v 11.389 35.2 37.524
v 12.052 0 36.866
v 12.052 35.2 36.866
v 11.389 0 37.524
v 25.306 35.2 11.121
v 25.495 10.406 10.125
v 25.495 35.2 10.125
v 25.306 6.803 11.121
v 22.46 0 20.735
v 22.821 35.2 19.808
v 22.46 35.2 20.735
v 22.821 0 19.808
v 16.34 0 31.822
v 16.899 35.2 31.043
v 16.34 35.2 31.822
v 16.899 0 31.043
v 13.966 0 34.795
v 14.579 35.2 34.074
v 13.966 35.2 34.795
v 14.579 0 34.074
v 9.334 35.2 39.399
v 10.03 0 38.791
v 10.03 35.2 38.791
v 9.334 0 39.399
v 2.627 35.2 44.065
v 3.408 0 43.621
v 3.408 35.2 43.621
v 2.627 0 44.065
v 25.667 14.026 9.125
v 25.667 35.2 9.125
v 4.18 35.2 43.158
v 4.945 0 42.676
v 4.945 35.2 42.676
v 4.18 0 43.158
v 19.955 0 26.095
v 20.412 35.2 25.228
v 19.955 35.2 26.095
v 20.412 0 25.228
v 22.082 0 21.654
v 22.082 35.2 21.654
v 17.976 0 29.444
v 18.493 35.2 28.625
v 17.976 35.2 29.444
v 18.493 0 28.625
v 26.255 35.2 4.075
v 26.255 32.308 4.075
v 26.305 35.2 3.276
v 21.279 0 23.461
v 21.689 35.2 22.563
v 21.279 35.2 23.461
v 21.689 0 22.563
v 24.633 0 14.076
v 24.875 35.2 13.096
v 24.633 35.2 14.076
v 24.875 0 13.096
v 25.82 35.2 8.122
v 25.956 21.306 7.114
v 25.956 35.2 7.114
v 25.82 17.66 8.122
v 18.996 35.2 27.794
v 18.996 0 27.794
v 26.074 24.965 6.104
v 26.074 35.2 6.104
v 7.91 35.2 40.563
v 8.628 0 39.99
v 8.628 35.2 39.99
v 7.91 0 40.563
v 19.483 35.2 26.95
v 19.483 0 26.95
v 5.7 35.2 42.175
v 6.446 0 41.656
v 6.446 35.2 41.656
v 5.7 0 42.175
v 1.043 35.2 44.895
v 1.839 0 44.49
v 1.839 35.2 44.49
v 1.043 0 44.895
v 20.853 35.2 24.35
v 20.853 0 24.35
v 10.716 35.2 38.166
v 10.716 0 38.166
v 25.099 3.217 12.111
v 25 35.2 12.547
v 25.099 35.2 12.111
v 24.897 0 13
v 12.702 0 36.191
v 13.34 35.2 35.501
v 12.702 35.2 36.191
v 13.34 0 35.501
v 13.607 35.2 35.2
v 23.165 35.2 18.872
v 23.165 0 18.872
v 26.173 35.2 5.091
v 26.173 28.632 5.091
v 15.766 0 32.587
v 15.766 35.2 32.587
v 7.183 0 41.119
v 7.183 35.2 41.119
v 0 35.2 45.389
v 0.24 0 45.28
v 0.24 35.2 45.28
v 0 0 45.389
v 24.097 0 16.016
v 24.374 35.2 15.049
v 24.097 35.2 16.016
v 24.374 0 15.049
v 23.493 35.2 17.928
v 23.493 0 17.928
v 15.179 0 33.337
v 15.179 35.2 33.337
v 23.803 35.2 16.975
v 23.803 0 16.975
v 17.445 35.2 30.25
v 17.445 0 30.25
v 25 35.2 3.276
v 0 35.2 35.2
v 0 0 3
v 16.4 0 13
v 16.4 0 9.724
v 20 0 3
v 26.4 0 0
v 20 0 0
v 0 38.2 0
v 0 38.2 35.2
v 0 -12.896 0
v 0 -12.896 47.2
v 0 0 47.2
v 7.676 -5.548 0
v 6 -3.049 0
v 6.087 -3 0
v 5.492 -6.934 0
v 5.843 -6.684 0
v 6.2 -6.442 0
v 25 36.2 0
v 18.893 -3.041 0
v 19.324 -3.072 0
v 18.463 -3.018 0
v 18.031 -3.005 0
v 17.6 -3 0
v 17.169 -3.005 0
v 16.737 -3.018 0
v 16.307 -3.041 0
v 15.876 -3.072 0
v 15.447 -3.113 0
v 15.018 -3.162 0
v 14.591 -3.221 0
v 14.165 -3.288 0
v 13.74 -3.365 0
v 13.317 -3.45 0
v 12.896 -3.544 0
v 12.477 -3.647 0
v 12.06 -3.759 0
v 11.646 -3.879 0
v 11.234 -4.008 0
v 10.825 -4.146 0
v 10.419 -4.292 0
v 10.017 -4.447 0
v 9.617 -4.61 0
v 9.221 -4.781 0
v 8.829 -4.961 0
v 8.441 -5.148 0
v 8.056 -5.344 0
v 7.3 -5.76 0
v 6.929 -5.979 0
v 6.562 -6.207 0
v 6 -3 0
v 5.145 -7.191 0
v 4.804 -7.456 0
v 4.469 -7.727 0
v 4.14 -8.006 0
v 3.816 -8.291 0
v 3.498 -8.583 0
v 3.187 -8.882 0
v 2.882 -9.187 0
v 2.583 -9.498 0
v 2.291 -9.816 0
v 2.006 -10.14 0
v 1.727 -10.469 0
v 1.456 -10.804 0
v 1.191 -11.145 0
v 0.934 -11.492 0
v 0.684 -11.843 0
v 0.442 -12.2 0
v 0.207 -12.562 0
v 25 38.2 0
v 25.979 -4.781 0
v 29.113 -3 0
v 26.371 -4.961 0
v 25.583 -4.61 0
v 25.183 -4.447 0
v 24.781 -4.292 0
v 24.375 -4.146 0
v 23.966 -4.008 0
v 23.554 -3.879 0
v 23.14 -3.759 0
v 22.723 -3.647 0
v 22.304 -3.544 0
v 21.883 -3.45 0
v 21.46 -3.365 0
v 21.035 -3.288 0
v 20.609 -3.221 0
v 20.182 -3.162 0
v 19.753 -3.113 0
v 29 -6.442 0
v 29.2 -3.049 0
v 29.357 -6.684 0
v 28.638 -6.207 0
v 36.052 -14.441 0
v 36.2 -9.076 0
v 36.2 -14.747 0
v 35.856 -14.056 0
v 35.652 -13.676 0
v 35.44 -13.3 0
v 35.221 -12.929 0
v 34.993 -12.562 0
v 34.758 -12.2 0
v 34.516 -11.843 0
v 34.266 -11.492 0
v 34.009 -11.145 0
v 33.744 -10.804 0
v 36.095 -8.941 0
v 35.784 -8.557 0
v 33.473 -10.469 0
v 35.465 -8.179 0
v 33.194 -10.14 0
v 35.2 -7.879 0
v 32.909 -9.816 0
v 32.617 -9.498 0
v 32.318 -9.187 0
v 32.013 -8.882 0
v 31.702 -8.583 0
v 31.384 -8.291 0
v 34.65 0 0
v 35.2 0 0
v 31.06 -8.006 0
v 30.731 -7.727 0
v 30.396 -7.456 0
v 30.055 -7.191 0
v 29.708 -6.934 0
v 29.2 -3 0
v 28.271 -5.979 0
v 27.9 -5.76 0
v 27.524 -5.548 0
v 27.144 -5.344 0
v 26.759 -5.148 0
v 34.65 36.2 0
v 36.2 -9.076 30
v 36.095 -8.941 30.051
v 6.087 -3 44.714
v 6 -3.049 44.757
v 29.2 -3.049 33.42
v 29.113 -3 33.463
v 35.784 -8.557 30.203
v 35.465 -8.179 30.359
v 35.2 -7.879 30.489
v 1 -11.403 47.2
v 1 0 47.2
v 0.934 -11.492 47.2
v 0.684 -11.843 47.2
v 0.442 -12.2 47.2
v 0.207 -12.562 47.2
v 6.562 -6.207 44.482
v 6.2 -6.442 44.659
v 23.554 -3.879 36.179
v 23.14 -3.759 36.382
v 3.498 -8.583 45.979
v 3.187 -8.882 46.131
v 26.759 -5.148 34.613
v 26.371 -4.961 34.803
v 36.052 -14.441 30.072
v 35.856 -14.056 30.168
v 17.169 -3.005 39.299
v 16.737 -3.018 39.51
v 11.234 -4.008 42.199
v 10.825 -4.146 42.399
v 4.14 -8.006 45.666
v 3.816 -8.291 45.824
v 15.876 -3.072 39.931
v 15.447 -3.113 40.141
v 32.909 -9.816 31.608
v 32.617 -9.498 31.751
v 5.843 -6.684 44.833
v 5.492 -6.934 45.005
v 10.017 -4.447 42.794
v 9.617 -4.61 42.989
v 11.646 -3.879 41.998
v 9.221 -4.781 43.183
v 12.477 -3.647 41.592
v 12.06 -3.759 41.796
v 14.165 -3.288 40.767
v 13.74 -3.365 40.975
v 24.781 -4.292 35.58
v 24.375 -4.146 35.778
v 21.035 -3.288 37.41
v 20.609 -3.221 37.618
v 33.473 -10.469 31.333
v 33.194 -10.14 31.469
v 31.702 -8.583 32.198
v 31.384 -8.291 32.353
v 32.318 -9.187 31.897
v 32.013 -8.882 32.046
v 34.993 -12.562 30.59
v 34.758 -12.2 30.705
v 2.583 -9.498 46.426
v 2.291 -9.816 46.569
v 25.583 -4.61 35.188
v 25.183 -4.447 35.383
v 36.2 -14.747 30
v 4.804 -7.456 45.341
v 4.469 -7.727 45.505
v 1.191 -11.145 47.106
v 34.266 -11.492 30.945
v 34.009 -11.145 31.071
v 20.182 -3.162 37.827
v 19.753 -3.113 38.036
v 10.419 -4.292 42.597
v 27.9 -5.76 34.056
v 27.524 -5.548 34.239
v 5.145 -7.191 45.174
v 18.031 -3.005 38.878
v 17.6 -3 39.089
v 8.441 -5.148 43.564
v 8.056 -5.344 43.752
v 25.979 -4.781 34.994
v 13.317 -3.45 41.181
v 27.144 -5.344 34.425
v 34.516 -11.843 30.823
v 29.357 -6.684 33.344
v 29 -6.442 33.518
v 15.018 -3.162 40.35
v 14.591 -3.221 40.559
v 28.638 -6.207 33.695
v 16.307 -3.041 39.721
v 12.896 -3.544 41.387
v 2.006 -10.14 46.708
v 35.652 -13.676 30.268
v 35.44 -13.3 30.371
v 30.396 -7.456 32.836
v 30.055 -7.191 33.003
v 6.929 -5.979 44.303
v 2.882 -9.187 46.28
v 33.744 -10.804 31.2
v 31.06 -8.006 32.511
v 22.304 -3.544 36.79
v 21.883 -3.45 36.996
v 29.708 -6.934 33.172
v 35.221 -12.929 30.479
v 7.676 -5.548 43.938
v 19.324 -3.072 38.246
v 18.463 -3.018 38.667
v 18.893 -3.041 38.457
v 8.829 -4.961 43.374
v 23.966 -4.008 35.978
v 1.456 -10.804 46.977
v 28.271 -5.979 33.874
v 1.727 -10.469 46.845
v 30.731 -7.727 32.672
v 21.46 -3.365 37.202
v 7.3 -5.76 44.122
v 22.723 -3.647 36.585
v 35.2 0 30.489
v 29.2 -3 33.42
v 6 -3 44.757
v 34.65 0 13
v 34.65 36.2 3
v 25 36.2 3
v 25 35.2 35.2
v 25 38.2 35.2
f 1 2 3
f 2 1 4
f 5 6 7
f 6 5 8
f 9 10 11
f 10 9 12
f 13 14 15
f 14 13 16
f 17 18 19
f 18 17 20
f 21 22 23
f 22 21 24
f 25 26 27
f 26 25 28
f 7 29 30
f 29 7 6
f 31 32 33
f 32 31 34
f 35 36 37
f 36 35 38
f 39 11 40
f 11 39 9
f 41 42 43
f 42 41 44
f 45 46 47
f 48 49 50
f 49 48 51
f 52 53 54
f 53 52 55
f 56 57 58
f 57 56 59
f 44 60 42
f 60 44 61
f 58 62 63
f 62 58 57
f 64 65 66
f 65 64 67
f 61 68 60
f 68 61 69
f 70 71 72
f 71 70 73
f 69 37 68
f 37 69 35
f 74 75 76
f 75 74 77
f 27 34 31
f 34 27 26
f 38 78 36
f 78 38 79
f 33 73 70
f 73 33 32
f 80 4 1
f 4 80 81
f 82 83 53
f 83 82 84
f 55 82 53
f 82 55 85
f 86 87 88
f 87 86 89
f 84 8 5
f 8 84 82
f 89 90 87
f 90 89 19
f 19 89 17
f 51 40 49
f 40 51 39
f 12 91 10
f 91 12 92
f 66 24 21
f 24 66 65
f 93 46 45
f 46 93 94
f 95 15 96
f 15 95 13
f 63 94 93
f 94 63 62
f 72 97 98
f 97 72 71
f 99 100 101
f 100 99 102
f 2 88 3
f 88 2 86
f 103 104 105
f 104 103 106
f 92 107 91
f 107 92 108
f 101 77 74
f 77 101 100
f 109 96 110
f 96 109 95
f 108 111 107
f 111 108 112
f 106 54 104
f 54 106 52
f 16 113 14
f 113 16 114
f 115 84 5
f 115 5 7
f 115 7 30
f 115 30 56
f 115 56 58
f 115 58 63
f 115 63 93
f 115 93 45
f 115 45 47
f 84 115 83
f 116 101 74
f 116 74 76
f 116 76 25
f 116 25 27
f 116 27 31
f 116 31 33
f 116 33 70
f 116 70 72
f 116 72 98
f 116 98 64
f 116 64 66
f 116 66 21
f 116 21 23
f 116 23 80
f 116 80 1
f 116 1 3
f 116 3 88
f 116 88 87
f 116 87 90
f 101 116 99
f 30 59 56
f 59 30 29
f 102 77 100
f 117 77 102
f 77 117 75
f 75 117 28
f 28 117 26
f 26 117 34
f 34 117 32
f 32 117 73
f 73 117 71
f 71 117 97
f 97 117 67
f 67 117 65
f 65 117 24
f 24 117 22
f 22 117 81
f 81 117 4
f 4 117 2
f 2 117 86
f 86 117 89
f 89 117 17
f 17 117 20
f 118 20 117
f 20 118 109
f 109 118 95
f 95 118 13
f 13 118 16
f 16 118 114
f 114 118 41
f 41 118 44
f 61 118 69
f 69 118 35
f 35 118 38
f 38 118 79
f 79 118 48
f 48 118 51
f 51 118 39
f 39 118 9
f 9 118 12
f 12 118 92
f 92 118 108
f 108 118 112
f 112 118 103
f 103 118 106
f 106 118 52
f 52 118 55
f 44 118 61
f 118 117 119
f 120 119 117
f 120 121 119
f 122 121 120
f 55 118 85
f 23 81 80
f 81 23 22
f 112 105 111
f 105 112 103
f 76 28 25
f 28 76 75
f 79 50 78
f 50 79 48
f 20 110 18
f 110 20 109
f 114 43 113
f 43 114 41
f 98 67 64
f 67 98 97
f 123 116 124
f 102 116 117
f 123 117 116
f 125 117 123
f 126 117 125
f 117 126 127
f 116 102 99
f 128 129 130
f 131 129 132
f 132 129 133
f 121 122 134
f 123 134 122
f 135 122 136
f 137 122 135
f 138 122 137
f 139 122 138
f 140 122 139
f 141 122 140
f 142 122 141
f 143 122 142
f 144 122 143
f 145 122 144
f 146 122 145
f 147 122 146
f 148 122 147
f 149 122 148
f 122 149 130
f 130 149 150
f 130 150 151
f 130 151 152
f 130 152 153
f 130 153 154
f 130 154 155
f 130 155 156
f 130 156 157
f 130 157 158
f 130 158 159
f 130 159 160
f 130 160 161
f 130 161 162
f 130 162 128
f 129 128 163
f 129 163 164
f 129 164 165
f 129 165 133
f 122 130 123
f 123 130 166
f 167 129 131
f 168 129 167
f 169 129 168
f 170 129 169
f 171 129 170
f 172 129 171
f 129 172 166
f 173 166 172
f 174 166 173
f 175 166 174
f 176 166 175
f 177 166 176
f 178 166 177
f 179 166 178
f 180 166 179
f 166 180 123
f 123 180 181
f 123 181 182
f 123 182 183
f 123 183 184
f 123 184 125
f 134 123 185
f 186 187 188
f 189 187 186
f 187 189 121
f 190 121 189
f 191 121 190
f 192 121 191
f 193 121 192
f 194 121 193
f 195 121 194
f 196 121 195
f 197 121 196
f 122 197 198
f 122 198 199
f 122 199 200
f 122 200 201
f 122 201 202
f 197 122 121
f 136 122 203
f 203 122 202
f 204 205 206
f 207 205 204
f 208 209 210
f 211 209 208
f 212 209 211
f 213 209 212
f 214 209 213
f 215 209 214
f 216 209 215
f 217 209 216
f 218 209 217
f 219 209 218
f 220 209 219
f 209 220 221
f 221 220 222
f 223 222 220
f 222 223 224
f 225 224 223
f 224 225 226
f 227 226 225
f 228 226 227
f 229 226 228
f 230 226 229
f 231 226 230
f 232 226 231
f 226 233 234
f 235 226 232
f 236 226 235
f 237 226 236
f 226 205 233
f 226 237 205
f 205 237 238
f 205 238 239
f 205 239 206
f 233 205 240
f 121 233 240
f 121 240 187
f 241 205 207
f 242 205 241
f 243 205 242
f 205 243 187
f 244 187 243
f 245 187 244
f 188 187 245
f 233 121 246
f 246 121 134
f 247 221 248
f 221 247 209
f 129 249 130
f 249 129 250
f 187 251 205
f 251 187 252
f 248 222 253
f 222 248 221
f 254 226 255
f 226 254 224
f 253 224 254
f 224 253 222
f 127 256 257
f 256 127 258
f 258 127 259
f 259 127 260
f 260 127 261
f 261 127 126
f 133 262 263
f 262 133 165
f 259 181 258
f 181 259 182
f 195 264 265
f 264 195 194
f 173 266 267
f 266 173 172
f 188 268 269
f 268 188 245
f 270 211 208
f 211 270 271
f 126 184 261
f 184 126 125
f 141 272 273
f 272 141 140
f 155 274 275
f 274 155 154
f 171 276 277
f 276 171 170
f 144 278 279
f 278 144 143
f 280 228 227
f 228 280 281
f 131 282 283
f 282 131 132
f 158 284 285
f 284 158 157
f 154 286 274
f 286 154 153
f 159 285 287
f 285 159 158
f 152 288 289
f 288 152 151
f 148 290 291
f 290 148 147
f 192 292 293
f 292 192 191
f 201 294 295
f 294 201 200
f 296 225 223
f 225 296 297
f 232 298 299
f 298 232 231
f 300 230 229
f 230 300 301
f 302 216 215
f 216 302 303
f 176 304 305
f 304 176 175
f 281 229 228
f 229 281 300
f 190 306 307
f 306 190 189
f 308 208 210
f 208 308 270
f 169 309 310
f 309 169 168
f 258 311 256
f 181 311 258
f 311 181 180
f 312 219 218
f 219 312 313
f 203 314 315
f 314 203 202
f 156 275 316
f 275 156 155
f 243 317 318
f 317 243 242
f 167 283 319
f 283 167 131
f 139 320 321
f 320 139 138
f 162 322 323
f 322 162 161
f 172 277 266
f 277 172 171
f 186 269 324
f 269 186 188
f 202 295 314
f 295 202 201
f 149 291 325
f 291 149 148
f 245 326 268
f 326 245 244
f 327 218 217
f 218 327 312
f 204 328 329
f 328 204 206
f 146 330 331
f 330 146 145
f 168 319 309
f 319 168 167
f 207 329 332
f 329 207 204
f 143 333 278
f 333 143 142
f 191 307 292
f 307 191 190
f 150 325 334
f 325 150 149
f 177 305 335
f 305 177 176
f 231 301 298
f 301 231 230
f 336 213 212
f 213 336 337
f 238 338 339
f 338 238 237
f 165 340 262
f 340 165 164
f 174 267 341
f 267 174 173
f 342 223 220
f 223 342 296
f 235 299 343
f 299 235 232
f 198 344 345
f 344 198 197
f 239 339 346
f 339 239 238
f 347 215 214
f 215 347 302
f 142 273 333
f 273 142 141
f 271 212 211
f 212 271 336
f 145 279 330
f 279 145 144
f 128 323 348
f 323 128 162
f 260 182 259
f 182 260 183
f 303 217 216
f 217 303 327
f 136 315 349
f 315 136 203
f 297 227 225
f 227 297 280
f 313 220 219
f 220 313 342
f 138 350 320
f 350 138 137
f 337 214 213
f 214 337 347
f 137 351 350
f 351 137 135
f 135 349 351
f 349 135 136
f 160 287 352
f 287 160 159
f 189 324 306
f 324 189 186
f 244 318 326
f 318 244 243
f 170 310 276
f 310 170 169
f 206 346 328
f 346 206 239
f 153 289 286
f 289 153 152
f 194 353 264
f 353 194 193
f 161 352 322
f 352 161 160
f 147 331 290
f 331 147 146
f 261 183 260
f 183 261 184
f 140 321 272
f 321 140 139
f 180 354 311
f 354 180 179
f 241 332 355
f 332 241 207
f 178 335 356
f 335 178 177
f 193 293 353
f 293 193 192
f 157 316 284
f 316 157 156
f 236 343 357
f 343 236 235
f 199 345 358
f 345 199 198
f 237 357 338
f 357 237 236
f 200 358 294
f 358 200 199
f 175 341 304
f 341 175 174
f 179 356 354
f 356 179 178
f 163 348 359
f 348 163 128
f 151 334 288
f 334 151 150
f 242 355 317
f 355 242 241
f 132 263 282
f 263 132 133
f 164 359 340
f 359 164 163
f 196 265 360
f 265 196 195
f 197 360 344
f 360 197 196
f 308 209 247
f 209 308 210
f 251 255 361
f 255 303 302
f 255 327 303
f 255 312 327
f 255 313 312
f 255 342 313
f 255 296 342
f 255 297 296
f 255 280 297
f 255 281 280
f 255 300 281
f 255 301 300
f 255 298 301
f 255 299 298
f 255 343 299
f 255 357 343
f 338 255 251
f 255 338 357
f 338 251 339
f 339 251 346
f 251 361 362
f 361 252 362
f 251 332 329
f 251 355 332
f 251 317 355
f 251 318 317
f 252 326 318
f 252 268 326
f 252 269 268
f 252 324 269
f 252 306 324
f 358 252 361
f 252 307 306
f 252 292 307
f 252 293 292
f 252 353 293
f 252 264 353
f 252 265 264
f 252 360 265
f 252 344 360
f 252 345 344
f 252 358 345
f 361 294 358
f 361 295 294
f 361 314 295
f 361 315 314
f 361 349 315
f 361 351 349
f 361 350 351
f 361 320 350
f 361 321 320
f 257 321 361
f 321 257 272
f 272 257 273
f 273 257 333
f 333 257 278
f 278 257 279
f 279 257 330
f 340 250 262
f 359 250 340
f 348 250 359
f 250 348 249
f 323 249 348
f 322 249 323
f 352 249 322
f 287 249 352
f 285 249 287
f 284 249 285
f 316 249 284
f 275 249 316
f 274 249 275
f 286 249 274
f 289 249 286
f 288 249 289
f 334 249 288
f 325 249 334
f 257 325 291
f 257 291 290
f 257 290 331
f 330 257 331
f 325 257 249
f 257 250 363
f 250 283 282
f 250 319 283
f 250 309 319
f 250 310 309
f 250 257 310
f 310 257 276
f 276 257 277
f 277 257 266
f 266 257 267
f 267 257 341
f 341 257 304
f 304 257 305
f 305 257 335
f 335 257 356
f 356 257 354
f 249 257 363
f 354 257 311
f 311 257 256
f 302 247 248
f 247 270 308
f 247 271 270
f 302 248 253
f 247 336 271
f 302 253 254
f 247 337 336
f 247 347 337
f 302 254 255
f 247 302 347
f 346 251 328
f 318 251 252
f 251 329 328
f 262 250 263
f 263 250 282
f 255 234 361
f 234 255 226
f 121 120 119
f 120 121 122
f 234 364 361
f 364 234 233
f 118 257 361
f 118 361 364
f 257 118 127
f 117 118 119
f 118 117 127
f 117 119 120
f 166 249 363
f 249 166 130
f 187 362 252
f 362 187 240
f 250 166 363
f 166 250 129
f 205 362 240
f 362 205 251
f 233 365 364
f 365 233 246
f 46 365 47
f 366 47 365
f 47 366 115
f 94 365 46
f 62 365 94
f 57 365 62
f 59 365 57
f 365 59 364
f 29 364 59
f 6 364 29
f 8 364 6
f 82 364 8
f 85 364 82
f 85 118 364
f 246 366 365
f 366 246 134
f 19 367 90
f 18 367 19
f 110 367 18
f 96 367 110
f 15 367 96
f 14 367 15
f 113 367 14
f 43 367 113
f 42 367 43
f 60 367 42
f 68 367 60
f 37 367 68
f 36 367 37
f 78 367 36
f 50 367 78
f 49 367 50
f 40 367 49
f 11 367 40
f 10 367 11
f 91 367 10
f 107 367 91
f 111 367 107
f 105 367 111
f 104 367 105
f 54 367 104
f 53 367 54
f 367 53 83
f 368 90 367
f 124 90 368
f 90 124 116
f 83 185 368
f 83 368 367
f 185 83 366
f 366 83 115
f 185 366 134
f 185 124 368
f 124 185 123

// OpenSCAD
// file: magazine.scad
//use <MCAD/regular_shapes.scad>

$fn = $preview ? 50 : 300;

WIGGLE_PERCENT = 10;
WIGGLE_COEFF = 1 + WIGGLE_PERCENT/100;
PIECE_D = 32 * WIGGLE_COEFF;
PIECE_H = 7.5 * WIGGLE_COEFF;

module piece() {
    difference() {
        cylinder(h=PIECE_H/WIGGLE_COEFF,
                 d=PIECE_D/WIGGLE_COEFF);

        translate([0, 0, -0.5])
        cylinder(h=1 + PIECE_H/WIGGLE_COEFF,
                 d=PIECE_D/WIGGLE_COEFF * 0.75);
    }
}

module piece_wiggle() { cylinder(h=PIECE_H, d=PIECE_D); }

BOARD_H = 197;
BOARD_W = 259;
BOARD_D = 16.5;

module board() { cube([BOARD_W, BOARD_D, BOARD_H]); }

HOPPER_W = 45;
HOPPER_L = 20;
HOPPER_H = 60;

module hole_negative() {
    scale([1.01, 1.01, 1.01])
    rotate([180, 0, 0])
    translate([0, 0, -HOPPER_H/2])
    hull()
    for (x = [-1, 1]) {
        for (y = [-1, 1]) {
            translate([1.1 * x * PIECE_D/2,
                       1.2 * y * PIECE_H/2,
                       0])
            square_pyramid(5.5, 7, HOPPER_H);
        }
    }
}

module hopper() {
    translate([0, 0, HOPPER_H / 2])
    difference() {
        cube([HOPPER_W, HOPPER_L, HOPPER_H], center=true);

        #
        translate([0, 0, 25])
        cube([HOPPER_W + 5, HOPPER_L + 2, 10], center=true);

        #
        hole_negative();
    }
}

//difference() {
//    hopper();
//    translate([-50, -50, 20])
//    #
//    cube([100, 100, 100]);
//}


ANGLE=40;
INNER_RAD=30;
THICKNESS=3;
PICKLES=30;

module hotdog() {
    rotate_extrude(angle=ANGLE)
    translate([INNER_RAD, 0, 0])
    square([THICKNESS, PIECE_D]);
}

module hamburg() {
    rotate_extrude(angle=ANGLE)
    translate([INNER_RAD, 0, 0])
    square([THICKNESS, PIECE_H]);
}

module pickle(ang, tx, ty) {
    translate([tx, ty, 0])
    rotate([0,0,ang])
    translate([-(INNER_RAD + THICKNESS), 1/2, 0])
    rotate([90, 0, 0])
    rotate_extrude(angle=ANGLE)
    translate([INNER_RAD, 0, 0])
    square(THICKNESS);
}

module hot_hamburg() {
    module pickle_slice() {
        dang = 90/PICKLES;
        for (i = [0:PICKLES-1]) {
            hull() {
                pickle(i*dang, 0, 0);
                pickle((i+1)*dang, 0, 0);
            }
        }
    }

    pickle_slice();

    translate([0, PIECE_H, 0])
    mirror([0, 1, 0])
    pickle_slice();

    translate([0, -(INNER_RAD + THICKNESS), 0])
    rotate([90, 0, 90])
    hotdog();

    translate([-(INNER_RAD + THICKNESS), PIECE_H, 0])
    rotate([90, 0, 0])
    hamburg();
}

module hot_hamburg_sandwich() {
    hot_hamburg();
    translate([PIECE_D, PIECE_H, 0])
    rotate([0, 0, 180])
    hot_hamburg();
}

//scale([1.05, 1.05, 1.05])
//hot_hamburg_sandwich();
//
//translate([PIECE_D/2,PIECE_H,0])
//rotate([90,0,0])
//#piece();

module mag(asHu) {
    CAPACITY = 15;
    ANGLE = 160;
    WALLS_HEIGHT = CAPACITY * PIECE_H + THICKNESS;

    translate([0, 0, THICKNESS])
    for (za = [0,180]) {

        rotate([0,0,za])
        rotate_extrude(angle=ANGLE)
        translate([PIECE_D/2, 0, 0])
        square([THICKNESS, WALLS_HEIGHT]);

    }
    cylinder(h=THICKNESS, d=PIECE_D + 2*THICKNESS);

    translate([0, 0, WALLS_HEIGHT])
    rotate_extrude(angle=360)
    translate([PIECE_D/2, 0,0])
    square([THICKNESS, THICKNESS]);
}

module string_rider() {
    difference() {
        cylinder(d=PIECE_D / WIGGLE_COEFF, h=PIECE_H);

        CHANNEL_H = PIECE_H / 3;
        #
        translate([0,0,CHANNEL_H/2 + 1])
        cube([PIECE_D * 2, 5, CHANNEL_H], center=true);
    }
}

//difference() {
//    X = -5;
//    Y = THICKNESS;
//
//    translate([-X/2, 0, 0])
//    cube([2 * MAG_R + X, MAG_R + Y, 20]);
//
//    MAG_R = PIECE_D/2 + THICKNESS;
//    translate([MAG_R, 0, -1])
//    cylinder(h=22, r=MAG_R);
//}

//translate([0,0,5])
//string_rider();

//*
//for (i = [0:CAPACITY-1]) {
//    translate([0,0,i*PIECE_H])
//    translate([0,0,THICKNESS])
//    #piece();
//}

//piece();
// main file
use <MCAD/regular_shapes.scad>
include <magazine.scad>

//translate([PIECE_D/2,0,0])
//%piece();

module ramp() {

    RAMP_THICKNESS = 3;
    RAMP_RISE = 30;
    RAMP_RUN = PIECE_D + 20;

    // Ramp
    translate([RAMP_THICKNESS, 0, 0])
    hull() {
        cube([PIECE_H, 1, RAMP_THICKNESS]);

        translate([0, RAMP_RUN, RAMP_RISE - THICKNESS])
        cube([PIECE_H, 1, RAMP_THICKNESS]);
    }

    // Walls
    TOP_HEIGHT = 30;
    // left wall
    hull() {
        cube([RAMP_THICKNESS, RAMP_RUN + 1, RAMP_RISE]);

        translate([0, 0, RAMP_RISE + TOP_HEIGHT])
        #cube([0.1, RAMP_RUN, 0.1]);
    }

    // back wall
    translate([0, RAMP_RUN - RAMP_THICKNESS + 1])
    cube([PIECE_H + RAMP_THICKNESS, RAMP_THICKNESS, RAMP_RISE + TOP_HEIGHT]);

    // right wall
    translate([RAMP_THICKNESS + PIECE_H, 0, 0])
    cube([RAMP_THICKNESS, RAMP_RUN + 1, RAMP_RISE + TOP_HEIGHT]);


    // Magazine sleeve
    SLEEVE_WIDTH = 12;
    SLEEVE_HEIGHT = RAMP_RISE;
    translate([-PIECE_D/2 - THICKNESS, RAMP_RUN/2, 0])
    {
        difference(){
            cylinder_tube(SLEEVE_HEIGHT, PIECE_D/2 + 2 * THICKNESS, THICKNESS);

            SLEEVE_CUT = 1000;
            translate([-SLEEVE_CUT/2 + SLEEVE_WIDTH, 0, 0])
            cube([SLEEVE_CUT, SLEEVE_CUT, SLEEVE_CUT], center=true);
        }

        %mag();
    }

}

module rotramp(height, dz, angle, width, depth) {
//    translate([width/2, depth/2, dz/2])
    for (z = [0:dz:height-dz]) {
        hull() {
            for (i = [0,1]) {
                rotate([0,0,(z + i*dz)/height * -angle])
                translate([0, 0, z + i*dz])
                cube([width, depth, dz], center=false);
            }
        }
    }
}

//RAMP_RUN = PIECE_D * 1.5;
//RAMP_ANGLE = 90;
//RAMP_WIDTH = PIECE_D;

//cube([THICKNESS, RAMP_RUN, PIECE_D]);

RAMP_RUN = PIECE_D;
RAMP_HEIGHT_GUESS = PIECE_D + 12; // This depends on STRETCH
STRETCH = 15;
RAMP_WIDTH = PIECE_D * 0.75;

module ramp() {

SLIDEY_COEFF = 1.9;
RAMP_ANGLE=30;
//intersection() {
//    scale([1, 1, 1.2])
//    translate([6.4, 0])
//    translate([0, 0, 1.2 * RAMP_WIDTH])
//    rotate([0, 90 - RAMP_ANGLE])
//    translate([SLIDEY_COEFF * RAMP_WIDTH - 10, 0, 0])
//    mirror([1,0,0])
//    rotate([-90, 0, 0])
//    rotramp(RAMP_RUN, $preview ? 1 : 0.05, RAMP_ANGLE, SLIDEY_COEFF * RAMP_WIDTH, THICKNESS);
//
//    cube(100);
//}

//translate([30, 0, 0])
//mirror([1,0])
//rotate([0, 30, 10])
//cube([THICKNESS, RAMP_RUN, RAMP_HEIGHT_GUESS]);

//translate([RAMP_WIDTH, 0])
//rotate([0, 90, 0])
//%piece();

translate([0, RAMP_RUN, 0])
rotate([90, 0, 0])
intersection()  {
    translate([-STRETCH, 0, 0])
    oval_prism(RAMP_RUN, PIECE_D + STRETCH - THICKNESS/2, RAMP_WIDTH + STRETCH);
    cube(10 * STRETCH);
}

//mirror([1,0])
//cube([THICKNESS, RAMP_RUN, RAMP_HEIGHT_GUESS + PIECE_H]);

CUPPER_CUTOFF = 15;
CUPPER_LOW_HEIGHT = 30;

module cupper_bounds() {
    translate([0, -CUPPER_CUTOFF])
    hull() {
        cube([1, CUPPER_CUTOFF, RAMP_HEIGHT_GUESS]);
        translate([PIECE_D,0])
        cube([1, CUPPER_CUTOFF, CUPPER_LOW_HEIGHT]);
    }
}

intersection() {
    translate([PIECE_D/2, -PIECE_D/2 - 2*THICKNESS]) {
//        %mag();
        cylinder_tube(RAMP_HEIGHT_GUESS, (PIECE_D + 4 * THICKNESS)/2, THICKNESS);
    }

    cupper_bounds();
}

intersection() {
    mirror([0, 1, 0])
    cube([PIECE_D, THICKNESS, RAMP_HEIGHT_GUESS]);
    cupper_bounds();
}

intersection() {
    cupper_bounds();
    mirror([0,1,0])
    cube([THICKNESS, CUPPER_CUTOFF - 6, RAMP_HEIGHT_GUESS]);
}

intersection() {
    cupper_bounds();
    translate([THICKNESS, 0])
    mirror([0,1,0])
    cube([THICKNESS, CUPPER_CUTOFF - 8.5, RAMP_HEIGHT_GUESS]);
}

intersection() {
    cupper_bounds();
    translate([PIECE_D - THICKNESS, 0])
    mirror([0,1,0])
    cube([THICKNESS, CUPPER_CUTOFF - 6, RAMP_HEIGHT_GUESS]);
}

intersection() {
    cupper_bounds();
    translate([PIECE_D - 2*THICKNESS, 0])
    mirror([0,1,0])
    cube([THICKNESS, CUPPER_CUTOFF - 8.5, RAMP_HEIGHT_GUESS]);
}

cube([20, RAMP_RUN, THICKNESS]);

hull(){
translate([0, RAMP_RUN, 0])
cube([25, THICKNESS, PIECE_D]);

//cube([THICKNESS, RAMP_RUN, PIECE_D]);
}
translate([RAMP_WIDTH, 0, 0]) {
    mirror([0,1])
    cube([PIECE_H, THICKNESS, CUPPER_LOW_HEIGHT]);

    hull() {
        mirror([0,1])
        translate([-10, 0, 10])
        cube([PIECE_H+10, 1, THICKNESS]);

        translate([-10, RAMP_RUN, 0])
        cube([PIECE_H+10, 1, THICKNESS]);

        cube([PIECE_H, RAMP_RUN, 1]);
    }

//    translate([PIECE_H, -10, 0])
//    cube([THICKNESS, RAMP_RUN + 10, 40]);

    // Grabbing platform
    %
    translate([0, RAMP_RUN, 0])
    {
        GRAB_LEN = PIECE_D / 1.333;
        cube([PIECE_H, GRAB_LEN, THICKNESS]);

        translate([-THICKNESS, 0, 0])
        cube([THICKNESS, GRAB_LEN, PIECE_D / 2]);

        translate([PIECE_H, 0, 0])
        cube([THICKNESS, GRAB_LEN, PIECE_D / 2]);

        translate([-THICKNESS, GRAB_LEN, 0])
        cube([PIECE_H + 2*THICKNESS, THICKNESS, PIECE_D / 3]);
    }
}
}
ramp();
// Ramp right wall raise / extension
//!cube([THICKNESS, RAMP_RUN + 10, 15]);

//    cube([1, 1, 1])

//translate([PIECE_D/2,0]) piece();
/////////////////
// OTHER STUFF //
/////////////////

// Width of plastic along top of board
RIM_WIDTH = 3.5;
// Dimensions of holes for game pieces
DROP_WIDTH = 8.85;
DROP_LENGTH = 33.57;
// Dimensions of board addon slot
SLOT_WIDTH = 4.3;
SLOT_LENGTH = 11;
//SLOT_RADIUS = 1;
//SLOT_DIAM = SLOT_RADIUS * 2;

module slot_leg_test() {
    cube([SLOT_WIDTH, SLOT_LENGTH, 15]);
}

LEG_HEIGHT = 150;
LEG_WIDTH = 17;
LEG_DEPTH = 6;

THICK_HEIGHT = LEG_HEIGHT - 50;
THICK_WIDTH = LEG_WIDTH;
THICK_DEPTH = 12;

LEG_SLOT_MALE_HEIGHT = 5;
CHANNEL_WIDTH = 4;
CHANNEL_DEPTH = 8;

CHANNEL_START_HEIGHT = LEG_HEIGHT - 20;
CHANNEL_GRAB_HEIGHT = LEG_HEIGHT - 85;
CHANNEL_GRAB_THICKNESS = 1.5;
module board_leg() {
    difference() {
        // main body
        hull() {
            cube([LEG_WIDTH, LEG_DEPTH, LEG_HEIGHT]);
            cube([THICK_WIDTH, THICK_DEPTH, THICK_HEIGHT]);
        }

        // channel
        translate([(LEG_WIDTH - CHANNEL_WIDTH)/2, -1, -1])
        cube([CHANNEL_WIDTH, CHANNEL_DEPTH + 1, CHANNEL_START_HEIGHT + 1]);
    }

    // channel grab
    translate([(LEG_WIDTH - CHANNEL_WIDTH)/2 - 1,0, CHANNEL_GRAB_HEIGHT - 10])
    cube([CHANNEL_WIDTH + 2, CHANNEL_GRAB_THICKNESS, 10]);

    // slot male end
    translate([LEG_WIDTH/2 - SLOT_LENGTH/2,0,LEG_HEIGHT])
    cube([SLOT_LENGTH, SLOT_WIDTH, LEG_SLOT_MALE_HEIGHT]);
}

//board_leg();

module board_leg_track_adapter() {
    scale([1.05, 1.05, 1])
    difference() {
        cube([THICK_WIDTH + 2*THICKNESS, THICK_DEPTH + 2*THICKNESS, 10]);
        translate([THICKNESS, THICKNESS, -0.5])
        cube([THICK_WIDTH, THICK_DEPTH, 11]);
    }

    cube([95, THICK_DEPTH + 2*THICKNESS, 1]);


}

//board_leg_track_adapter();

module track_wall() {
    TRACK_WIDTH = 23.5;
    cube([THICKNESS, 20, 5]);

    translate([THICKNESS,0])
    cube([TRACK_WIDTH, 20, 1]);

    translate([TRACK_WIDTH + THICKNESS, 0])
    cube([THICKNESS, 20, 5]);
}

//track_wall();

GUARD_WALL_LEN = 257;
//GUARD_WALL_LEN=20;
GUARD_HEIGHT = 5;

module halfwall()
{
cube([THICKNESS, GUARD_WALL_LEN/2, GUARD_HEIGHT]);

translate([-0.2, -8, 0])
mirror([1, 0, 0])
rotate([0, 0, 20])
cube([THICKNESS, 10, GUARD_HEIGHT]);
}

module fullwall()
{
    halfwall();

    translate([0, GUARD_WALL_LEN, 0])
    mirror([0, 1, 0])
    halfwall();
}
//halfwall();
//translate([DROP_WIDTH + THICKNESS, 0, 0])
//mirror([1, 0, 0])
//wall();

//cube([SLOT_LENGTH, SLOT_WIDTH, LEG_SLOT_MALE_HEIGHT ]);
